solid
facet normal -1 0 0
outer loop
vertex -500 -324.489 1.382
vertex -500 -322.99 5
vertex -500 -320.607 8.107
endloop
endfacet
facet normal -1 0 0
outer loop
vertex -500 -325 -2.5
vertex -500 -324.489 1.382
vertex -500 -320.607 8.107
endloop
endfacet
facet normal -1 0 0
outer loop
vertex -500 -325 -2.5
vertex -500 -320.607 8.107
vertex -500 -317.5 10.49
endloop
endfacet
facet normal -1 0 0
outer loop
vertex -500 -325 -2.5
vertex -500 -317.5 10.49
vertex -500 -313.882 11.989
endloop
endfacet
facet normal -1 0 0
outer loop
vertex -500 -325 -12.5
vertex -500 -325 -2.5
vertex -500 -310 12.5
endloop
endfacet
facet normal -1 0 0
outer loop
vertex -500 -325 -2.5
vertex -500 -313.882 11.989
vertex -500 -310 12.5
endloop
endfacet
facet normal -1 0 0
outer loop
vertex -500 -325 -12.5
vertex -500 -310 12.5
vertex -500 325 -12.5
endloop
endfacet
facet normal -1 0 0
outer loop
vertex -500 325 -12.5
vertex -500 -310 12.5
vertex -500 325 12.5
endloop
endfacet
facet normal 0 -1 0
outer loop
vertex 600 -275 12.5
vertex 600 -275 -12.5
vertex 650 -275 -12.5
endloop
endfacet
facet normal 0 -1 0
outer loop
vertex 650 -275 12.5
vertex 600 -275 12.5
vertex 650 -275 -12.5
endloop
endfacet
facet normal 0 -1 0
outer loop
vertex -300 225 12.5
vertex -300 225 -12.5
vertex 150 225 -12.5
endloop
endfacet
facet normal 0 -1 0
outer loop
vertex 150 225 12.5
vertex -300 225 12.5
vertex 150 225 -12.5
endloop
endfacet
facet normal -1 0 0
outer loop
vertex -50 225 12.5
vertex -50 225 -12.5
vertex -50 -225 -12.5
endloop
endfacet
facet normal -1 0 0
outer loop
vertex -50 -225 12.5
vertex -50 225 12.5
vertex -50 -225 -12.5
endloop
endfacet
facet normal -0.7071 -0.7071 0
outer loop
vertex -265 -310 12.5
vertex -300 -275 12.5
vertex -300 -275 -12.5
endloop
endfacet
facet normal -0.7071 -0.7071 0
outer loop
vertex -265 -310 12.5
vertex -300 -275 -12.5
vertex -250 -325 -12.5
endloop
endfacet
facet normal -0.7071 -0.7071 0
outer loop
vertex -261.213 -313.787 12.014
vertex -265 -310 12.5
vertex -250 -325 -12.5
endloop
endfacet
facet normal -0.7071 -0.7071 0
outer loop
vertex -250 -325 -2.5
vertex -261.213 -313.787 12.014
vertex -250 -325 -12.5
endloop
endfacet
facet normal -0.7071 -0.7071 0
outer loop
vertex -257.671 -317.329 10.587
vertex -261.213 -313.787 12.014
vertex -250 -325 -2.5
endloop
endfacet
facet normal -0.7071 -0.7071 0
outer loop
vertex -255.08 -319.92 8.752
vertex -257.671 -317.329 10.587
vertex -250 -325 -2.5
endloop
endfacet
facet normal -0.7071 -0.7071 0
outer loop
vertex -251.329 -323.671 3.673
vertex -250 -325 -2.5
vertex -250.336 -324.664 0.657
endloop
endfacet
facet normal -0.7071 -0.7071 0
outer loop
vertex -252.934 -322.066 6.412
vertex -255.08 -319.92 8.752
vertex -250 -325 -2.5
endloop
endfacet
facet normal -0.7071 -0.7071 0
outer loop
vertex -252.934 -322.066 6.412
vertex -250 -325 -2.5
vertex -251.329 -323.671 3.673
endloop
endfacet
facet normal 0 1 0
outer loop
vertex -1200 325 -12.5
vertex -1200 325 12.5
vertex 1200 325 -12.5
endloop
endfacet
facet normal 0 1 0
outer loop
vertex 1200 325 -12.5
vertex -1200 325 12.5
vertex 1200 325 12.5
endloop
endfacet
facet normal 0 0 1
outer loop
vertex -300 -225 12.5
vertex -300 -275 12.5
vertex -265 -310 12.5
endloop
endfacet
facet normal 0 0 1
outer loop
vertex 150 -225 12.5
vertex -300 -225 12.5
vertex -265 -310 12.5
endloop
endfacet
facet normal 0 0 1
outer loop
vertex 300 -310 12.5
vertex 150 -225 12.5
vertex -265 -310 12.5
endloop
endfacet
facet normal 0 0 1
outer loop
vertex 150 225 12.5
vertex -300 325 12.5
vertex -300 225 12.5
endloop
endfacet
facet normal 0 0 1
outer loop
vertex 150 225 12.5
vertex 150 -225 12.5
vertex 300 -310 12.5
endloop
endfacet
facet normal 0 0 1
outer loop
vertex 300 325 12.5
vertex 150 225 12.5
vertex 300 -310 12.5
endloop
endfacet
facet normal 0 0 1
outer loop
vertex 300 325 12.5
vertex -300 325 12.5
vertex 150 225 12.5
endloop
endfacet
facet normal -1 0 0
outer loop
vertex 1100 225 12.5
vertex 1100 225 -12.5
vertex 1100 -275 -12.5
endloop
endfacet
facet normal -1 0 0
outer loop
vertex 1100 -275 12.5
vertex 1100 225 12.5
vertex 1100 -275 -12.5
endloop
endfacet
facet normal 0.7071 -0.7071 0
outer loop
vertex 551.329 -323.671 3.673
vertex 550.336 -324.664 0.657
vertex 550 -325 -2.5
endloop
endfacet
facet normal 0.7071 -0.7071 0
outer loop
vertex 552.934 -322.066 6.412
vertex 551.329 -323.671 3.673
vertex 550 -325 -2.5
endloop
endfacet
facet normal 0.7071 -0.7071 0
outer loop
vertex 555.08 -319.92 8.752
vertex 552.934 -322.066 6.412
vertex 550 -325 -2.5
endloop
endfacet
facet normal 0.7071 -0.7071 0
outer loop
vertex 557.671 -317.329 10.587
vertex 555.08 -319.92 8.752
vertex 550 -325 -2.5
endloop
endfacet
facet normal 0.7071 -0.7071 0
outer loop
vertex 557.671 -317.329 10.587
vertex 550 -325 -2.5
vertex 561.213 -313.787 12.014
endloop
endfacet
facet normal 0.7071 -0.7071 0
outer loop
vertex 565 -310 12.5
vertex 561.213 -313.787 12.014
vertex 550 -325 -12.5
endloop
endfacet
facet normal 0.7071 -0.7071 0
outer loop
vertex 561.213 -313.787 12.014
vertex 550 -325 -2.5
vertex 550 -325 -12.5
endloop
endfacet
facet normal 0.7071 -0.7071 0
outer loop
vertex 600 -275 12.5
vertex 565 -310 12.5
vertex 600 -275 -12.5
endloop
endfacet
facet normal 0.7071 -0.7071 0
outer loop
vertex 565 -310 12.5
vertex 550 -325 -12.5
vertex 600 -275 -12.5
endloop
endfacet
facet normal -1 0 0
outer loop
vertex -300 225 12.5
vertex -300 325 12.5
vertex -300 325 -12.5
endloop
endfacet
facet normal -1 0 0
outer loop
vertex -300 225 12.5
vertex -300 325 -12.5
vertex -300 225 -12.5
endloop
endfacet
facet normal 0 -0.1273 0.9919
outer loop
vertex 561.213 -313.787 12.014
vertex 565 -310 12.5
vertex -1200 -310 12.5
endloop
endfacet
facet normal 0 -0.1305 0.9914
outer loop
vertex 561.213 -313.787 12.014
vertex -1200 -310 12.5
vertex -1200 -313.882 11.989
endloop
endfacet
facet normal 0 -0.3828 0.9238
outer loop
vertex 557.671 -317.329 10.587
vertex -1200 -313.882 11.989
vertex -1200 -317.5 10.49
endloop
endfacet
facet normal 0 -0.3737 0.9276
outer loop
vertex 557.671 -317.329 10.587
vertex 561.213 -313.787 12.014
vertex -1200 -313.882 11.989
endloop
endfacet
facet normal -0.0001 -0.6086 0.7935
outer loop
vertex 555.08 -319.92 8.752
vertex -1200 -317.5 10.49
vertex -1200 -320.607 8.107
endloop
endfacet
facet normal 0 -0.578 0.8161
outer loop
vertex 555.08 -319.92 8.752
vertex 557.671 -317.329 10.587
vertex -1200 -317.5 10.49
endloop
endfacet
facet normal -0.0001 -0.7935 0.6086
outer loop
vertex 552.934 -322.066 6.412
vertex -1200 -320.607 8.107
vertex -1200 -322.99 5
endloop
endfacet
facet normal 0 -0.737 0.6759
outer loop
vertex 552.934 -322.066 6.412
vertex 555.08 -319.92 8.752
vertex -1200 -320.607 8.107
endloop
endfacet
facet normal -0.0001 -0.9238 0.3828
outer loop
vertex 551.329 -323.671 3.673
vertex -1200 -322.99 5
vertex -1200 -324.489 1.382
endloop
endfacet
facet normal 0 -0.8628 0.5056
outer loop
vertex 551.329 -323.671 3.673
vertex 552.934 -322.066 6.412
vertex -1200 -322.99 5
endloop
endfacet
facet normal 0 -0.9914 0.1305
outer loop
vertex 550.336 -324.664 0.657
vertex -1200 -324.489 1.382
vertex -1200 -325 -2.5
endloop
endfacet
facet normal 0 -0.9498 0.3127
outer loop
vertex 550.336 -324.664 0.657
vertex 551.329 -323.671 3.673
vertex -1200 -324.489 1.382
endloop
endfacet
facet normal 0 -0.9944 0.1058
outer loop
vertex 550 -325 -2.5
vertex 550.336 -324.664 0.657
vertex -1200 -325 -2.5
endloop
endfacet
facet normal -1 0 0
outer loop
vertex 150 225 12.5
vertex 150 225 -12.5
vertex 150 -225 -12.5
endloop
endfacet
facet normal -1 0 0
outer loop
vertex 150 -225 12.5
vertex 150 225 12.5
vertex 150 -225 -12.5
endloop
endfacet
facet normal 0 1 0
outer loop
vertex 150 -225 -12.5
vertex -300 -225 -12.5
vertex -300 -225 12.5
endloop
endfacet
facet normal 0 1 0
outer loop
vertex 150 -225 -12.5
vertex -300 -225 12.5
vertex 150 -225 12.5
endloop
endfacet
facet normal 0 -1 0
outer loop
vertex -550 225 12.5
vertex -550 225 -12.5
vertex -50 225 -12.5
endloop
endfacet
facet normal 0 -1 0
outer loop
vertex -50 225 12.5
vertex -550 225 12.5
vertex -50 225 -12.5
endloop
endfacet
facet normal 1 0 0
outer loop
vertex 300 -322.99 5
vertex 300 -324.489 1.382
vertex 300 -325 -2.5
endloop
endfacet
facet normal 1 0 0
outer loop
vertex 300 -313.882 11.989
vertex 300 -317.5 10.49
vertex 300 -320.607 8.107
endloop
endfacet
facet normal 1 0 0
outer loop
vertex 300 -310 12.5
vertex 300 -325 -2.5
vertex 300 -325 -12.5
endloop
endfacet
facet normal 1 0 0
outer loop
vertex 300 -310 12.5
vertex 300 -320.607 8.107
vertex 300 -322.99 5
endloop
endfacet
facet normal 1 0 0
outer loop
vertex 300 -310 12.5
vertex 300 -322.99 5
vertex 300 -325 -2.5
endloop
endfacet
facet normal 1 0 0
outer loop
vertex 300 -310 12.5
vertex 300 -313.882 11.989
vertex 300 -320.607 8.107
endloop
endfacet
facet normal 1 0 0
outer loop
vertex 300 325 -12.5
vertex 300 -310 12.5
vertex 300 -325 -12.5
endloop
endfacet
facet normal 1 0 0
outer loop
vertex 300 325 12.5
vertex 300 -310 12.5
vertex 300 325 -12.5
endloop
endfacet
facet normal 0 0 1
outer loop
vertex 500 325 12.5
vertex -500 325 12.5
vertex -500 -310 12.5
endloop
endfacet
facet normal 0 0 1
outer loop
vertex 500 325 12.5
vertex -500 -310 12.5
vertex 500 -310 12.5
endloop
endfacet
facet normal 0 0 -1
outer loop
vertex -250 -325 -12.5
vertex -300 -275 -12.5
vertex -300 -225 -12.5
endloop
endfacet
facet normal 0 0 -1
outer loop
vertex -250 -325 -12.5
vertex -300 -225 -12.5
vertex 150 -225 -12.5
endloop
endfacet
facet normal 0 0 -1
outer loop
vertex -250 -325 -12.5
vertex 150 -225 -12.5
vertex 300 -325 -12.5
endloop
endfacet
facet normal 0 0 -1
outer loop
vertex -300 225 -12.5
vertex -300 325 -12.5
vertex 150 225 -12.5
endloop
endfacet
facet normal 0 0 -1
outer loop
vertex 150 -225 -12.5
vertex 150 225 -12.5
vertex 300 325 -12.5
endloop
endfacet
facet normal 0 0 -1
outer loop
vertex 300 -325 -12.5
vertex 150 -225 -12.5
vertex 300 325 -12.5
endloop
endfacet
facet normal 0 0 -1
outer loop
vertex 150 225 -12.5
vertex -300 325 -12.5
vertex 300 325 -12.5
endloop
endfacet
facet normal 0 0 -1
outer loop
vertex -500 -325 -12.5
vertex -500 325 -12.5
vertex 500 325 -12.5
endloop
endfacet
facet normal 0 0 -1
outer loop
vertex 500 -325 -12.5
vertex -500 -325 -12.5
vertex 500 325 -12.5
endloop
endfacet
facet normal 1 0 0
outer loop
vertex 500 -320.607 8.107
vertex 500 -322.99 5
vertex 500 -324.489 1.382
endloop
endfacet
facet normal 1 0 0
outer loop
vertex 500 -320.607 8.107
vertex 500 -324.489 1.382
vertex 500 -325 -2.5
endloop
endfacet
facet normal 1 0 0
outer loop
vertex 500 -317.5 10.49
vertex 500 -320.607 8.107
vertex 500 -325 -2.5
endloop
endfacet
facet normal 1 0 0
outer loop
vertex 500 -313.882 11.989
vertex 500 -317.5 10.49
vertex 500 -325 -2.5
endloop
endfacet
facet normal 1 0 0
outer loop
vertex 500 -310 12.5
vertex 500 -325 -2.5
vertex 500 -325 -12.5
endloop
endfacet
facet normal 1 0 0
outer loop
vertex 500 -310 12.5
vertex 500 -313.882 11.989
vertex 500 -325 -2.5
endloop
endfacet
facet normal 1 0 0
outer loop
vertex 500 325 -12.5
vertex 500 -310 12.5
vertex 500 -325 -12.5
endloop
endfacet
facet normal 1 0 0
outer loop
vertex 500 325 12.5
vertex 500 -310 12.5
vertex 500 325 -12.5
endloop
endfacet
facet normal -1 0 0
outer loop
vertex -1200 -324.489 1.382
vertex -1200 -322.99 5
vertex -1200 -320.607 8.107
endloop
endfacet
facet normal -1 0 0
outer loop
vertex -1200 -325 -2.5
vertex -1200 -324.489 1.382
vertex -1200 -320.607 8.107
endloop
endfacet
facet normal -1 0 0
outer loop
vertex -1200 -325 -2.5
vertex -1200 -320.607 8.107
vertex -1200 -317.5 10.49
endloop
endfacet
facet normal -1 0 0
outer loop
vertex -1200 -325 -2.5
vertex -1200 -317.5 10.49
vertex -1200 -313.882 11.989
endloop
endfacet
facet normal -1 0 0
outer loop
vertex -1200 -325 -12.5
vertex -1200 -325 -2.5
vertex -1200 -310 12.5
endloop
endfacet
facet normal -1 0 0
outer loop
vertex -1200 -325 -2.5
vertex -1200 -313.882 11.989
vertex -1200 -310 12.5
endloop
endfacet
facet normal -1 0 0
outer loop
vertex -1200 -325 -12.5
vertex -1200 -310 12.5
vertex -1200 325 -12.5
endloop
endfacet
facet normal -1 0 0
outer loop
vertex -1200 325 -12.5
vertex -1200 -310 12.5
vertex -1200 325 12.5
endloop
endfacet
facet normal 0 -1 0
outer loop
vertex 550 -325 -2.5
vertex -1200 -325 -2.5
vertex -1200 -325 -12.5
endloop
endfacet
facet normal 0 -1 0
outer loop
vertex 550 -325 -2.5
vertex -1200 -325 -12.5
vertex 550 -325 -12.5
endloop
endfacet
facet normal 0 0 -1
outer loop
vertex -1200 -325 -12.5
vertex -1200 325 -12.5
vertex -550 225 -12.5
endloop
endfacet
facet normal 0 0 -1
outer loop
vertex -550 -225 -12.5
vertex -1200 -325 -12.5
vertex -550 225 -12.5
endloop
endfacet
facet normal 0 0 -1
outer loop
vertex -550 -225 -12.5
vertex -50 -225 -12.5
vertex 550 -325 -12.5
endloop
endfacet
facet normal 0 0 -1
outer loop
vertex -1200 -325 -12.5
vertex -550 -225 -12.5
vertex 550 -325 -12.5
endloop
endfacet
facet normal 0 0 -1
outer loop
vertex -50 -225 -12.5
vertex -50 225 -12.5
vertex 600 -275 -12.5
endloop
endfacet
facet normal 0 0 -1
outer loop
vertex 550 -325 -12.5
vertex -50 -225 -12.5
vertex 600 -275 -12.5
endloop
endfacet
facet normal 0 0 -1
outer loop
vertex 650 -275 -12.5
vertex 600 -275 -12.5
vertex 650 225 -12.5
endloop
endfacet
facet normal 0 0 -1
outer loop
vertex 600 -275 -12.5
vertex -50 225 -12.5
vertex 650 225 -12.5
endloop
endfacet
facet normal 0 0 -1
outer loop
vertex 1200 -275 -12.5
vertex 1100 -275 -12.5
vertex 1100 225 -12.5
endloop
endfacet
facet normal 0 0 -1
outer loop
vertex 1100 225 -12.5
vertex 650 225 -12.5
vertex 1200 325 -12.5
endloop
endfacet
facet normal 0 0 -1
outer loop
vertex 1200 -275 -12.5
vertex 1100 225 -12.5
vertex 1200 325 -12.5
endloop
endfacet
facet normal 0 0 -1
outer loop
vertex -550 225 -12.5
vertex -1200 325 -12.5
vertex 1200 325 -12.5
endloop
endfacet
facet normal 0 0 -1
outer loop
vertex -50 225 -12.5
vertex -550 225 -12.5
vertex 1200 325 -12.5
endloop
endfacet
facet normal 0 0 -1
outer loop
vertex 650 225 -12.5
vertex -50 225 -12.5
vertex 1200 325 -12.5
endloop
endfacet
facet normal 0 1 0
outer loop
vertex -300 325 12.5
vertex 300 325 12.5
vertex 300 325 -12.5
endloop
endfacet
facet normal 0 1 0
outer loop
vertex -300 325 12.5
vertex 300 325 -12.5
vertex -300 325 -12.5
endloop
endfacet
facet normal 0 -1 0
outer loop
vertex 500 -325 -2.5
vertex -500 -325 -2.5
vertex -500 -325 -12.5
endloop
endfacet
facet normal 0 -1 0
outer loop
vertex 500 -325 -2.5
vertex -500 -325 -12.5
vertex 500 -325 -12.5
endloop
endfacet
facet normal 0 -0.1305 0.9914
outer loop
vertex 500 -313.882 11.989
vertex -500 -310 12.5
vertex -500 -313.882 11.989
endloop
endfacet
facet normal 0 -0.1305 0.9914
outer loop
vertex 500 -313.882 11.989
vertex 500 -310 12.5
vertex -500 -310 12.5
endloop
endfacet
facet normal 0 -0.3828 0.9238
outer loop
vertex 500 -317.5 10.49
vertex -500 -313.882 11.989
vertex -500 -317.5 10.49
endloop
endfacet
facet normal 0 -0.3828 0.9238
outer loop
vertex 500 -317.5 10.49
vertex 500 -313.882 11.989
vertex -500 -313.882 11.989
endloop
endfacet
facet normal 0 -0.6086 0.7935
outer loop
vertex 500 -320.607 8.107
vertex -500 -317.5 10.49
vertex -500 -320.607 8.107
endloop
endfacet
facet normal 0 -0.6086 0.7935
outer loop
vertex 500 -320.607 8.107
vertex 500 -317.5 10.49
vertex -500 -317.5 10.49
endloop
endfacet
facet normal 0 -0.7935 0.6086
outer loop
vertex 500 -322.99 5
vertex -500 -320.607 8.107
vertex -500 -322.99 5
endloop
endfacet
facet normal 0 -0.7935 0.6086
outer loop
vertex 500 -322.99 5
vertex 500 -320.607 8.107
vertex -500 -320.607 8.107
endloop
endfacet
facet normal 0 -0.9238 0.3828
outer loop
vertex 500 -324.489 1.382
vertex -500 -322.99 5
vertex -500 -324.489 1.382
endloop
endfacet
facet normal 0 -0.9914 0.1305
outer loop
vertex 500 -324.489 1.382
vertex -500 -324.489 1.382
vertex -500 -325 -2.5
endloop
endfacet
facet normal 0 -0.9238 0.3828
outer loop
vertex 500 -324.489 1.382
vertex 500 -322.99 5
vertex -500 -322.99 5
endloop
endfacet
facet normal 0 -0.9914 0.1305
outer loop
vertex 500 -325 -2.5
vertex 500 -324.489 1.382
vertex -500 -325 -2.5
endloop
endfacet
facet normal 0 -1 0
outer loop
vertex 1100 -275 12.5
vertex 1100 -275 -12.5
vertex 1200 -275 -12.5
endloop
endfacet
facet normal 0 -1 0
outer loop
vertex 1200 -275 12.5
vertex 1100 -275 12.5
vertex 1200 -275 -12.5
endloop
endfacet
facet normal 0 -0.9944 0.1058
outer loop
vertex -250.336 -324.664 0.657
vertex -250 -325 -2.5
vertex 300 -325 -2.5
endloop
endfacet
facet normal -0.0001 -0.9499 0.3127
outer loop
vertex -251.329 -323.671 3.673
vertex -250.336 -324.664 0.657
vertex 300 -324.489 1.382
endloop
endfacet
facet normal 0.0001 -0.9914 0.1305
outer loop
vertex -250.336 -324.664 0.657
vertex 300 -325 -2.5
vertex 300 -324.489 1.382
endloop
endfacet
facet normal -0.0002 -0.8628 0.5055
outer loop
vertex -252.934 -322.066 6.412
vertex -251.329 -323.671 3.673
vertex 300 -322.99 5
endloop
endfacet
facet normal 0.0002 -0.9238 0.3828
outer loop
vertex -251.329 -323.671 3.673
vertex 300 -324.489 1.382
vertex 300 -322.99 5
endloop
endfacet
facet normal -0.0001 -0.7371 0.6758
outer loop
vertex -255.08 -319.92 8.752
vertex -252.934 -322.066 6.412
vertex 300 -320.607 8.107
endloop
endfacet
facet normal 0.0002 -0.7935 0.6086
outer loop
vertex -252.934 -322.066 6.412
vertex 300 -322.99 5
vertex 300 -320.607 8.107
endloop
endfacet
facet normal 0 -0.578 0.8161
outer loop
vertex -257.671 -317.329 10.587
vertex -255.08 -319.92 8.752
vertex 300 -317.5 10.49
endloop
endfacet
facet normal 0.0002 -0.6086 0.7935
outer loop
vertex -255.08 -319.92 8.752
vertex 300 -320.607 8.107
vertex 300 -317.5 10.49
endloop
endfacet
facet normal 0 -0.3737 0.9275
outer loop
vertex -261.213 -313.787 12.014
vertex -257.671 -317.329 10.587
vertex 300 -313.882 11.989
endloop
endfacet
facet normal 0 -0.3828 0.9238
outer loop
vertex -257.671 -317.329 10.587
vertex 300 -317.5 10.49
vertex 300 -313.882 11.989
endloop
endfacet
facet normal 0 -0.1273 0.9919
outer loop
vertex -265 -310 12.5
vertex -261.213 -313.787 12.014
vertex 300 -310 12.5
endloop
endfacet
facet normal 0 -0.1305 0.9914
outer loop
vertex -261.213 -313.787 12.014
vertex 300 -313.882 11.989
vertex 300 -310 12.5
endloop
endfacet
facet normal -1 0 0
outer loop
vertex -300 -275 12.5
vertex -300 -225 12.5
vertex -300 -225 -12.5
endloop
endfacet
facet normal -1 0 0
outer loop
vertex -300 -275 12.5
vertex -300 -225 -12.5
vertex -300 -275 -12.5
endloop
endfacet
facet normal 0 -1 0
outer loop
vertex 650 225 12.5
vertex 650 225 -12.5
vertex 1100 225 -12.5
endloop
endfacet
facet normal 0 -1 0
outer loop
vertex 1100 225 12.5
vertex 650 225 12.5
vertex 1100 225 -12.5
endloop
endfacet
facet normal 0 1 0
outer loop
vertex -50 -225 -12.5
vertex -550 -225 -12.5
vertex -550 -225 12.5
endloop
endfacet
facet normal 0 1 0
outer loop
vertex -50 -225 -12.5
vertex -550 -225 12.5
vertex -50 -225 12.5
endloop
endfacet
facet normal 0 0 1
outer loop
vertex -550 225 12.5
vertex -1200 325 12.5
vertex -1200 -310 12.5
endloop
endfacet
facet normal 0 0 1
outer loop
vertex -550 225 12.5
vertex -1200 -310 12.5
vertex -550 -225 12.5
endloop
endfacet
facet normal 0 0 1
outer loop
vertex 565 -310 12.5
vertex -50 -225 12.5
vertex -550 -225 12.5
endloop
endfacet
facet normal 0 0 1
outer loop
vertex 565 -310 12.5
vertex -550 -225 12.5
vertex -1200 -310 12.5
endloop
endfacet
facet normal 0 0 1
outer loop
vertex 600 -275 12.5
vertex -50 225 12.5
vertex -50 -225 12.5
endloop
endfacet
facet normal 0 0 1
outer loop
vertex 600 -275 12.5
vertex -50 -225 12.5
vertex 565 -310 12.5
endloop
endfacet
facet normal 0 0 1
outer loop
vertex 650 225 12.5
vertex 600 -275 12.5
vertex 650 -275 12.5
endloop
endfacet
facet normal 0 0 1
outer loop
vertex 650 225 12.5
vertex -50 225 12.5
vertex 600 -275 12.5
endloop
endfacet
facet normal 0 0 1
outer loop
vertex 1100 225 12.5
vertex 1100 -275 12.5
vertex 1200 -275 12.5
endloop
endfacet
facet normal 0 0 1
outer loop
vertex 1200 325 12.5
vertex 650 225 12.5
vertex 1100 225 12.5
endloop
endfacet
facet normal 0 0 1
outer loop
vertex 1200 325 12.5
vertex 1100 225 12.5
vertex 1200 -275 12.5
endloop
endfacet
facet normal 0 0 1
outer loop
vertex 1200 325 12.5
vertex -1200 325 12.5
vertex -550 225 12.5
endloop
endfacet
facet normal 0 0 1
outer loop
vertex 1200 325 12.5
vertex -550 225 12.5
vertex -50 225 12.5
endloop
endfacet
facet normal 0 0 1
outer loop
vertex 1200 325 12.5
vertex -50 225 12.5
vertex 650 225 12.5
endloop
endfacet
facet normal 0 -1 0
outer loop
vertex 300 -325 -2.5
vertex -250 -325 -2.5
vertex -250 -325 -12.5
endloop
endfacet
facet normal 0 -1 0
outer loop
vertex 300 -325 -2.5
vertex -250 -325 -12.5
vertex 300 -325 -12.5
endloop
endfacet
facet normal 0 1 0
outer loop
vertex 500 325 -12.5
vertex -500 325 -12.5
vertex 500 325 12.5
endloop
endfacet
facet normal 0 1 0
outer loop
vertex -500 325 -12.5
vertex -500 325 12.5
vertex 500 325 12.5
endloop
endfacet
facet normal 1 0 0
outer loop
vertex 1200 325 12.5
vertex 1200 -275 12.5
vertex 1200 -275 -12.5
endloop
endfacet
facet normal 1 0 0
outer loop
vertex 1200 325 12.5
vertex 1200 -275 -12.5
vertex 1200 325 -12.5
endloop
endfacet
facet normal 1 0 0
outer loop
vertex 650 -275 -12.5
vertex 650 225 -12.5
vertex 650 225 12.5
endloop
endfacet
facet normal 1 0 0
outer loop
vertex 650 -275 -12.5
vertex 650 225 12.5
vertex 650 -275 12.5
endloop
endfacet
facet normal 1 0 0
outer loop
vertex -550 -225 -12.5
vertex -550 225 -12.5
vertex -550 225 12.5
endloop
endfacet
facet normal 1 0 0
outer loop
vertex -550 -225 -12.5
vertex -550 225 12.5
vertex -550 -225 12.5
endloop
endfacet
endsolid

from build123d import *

# Parameters (mm, degrees)
F0_W      = 2400
F0_H      = 650
F1_DEPTH  = 12.5
F2_R      = 15
F4_DEPTH  = 25.001
F6_DEPTH  = 12.5
F7_R      = 15
F8_W      = 450
F8_H      = 500
F9_DEPTH  = 25.001
F10_W     = 450
F10_H     = 450
F11_DEPTH = 25.001
F12_W     = 1000
F12_H     = 650
F13_DEPTH = 12.5
F14_R     = 15
F15_W     = 500
F15_H     = 450
F16_DEPTH = 25.001


with BuildPart() as f1:
    # F0 (on Top) → F1 (new body, symmetric)
    with BuildSketch(Plane.XY):
        Rectangle(F0_W, F0_H)
    extrude(amount=F1_DEPTH, both=True)

    # F2
    f2_edges = [f1.edges().sort_by_distance(p)[0] for p in [
        (0, -325, 12.5),
    ]]
    fillet(f2_edges, radius=F2_R)

    # F3 (on face) → F4 (cut, through all)
    with BuildSketch(Plane(origin=(0, 0, -12.5), x_dir=(1, 0, 0), z_dir=(0, 0, -1))):
        Polygon((1200, 275), (1200, 325), (550, 325), (600, 275), align=None)
    extrude(amount=-F4_DEPTH, mode=Mode.SUBTRACT)

    # F8 (on face) → F9 (cut, through all)
    with BuildSketch(Plane(origin=(0, 0, -12.5), x_dir=(1, 0, 0), z_dir=(0, 0, -1))):
        with Locations((875, 25)):
            Rectangle(F8_W, F8_H)
    extrude(amount=-F9_DEPTH, mode=Mode.SUBTRACT)

    # F15 (on face) → F16 (cut, through all)
    with BuildSketch(Plane(origin=(0, 0, -12.5), x_dir=(1, 0, 0), z_dir=(0, 0, -1))):
        with Locations((-300, 0)):
            Rectangle(F15_W, F15_H)
    extrude(amount=-F16_DEPTH, mode=Mode.SUBTRACT)


with BuildPart() as f6:
    # F5 (on Top) → F6 (new body, symmetric)
    with BuildSketch(Plane.XY):
        Polygon((-250, -325), (300, -325), (300, 325), (-300, 325), (-300, -275), align=None)
    extrude(amount=F6_DEPTH, both=True)

    # F7
    f7_edges = [f6.edges().sort_by_distance(p)[0] for p in [
        (25, -325, 12.5),
    ]]
    fillet(f7_edges, radius=F7_R)

    # F10 (on face) → F11 (cut, through all)
    with BuildSketch(Plane(origin=(0, 0, -12.5), x_dir=(1, 0, 0), z_dir=(0, 0, -1))):
        with Locations((-75, 0)):
            Rectangle(F10_W, F10_H)
    extrude(amount=-F11_DEPTH, mode=Mode.SUBTRACT)


with BuildPart() as f13:
    # F12 (on Top) → F13 (new body, symmetric)
    with BuildSketch(Plane.XY):
        Rectangle(F12_W, F12_H)
    extrude(amount=F13_DEPTH, both=True)

    # F14
    f14_edges = [f13.edges().sort_by_distance(p)[0] for p in [
        (0, -325, 12.5),
    ]]
    fillet(f14_edges, radius=F14_R)


solid = Compound([f1.part, f6.part, f13.part])
